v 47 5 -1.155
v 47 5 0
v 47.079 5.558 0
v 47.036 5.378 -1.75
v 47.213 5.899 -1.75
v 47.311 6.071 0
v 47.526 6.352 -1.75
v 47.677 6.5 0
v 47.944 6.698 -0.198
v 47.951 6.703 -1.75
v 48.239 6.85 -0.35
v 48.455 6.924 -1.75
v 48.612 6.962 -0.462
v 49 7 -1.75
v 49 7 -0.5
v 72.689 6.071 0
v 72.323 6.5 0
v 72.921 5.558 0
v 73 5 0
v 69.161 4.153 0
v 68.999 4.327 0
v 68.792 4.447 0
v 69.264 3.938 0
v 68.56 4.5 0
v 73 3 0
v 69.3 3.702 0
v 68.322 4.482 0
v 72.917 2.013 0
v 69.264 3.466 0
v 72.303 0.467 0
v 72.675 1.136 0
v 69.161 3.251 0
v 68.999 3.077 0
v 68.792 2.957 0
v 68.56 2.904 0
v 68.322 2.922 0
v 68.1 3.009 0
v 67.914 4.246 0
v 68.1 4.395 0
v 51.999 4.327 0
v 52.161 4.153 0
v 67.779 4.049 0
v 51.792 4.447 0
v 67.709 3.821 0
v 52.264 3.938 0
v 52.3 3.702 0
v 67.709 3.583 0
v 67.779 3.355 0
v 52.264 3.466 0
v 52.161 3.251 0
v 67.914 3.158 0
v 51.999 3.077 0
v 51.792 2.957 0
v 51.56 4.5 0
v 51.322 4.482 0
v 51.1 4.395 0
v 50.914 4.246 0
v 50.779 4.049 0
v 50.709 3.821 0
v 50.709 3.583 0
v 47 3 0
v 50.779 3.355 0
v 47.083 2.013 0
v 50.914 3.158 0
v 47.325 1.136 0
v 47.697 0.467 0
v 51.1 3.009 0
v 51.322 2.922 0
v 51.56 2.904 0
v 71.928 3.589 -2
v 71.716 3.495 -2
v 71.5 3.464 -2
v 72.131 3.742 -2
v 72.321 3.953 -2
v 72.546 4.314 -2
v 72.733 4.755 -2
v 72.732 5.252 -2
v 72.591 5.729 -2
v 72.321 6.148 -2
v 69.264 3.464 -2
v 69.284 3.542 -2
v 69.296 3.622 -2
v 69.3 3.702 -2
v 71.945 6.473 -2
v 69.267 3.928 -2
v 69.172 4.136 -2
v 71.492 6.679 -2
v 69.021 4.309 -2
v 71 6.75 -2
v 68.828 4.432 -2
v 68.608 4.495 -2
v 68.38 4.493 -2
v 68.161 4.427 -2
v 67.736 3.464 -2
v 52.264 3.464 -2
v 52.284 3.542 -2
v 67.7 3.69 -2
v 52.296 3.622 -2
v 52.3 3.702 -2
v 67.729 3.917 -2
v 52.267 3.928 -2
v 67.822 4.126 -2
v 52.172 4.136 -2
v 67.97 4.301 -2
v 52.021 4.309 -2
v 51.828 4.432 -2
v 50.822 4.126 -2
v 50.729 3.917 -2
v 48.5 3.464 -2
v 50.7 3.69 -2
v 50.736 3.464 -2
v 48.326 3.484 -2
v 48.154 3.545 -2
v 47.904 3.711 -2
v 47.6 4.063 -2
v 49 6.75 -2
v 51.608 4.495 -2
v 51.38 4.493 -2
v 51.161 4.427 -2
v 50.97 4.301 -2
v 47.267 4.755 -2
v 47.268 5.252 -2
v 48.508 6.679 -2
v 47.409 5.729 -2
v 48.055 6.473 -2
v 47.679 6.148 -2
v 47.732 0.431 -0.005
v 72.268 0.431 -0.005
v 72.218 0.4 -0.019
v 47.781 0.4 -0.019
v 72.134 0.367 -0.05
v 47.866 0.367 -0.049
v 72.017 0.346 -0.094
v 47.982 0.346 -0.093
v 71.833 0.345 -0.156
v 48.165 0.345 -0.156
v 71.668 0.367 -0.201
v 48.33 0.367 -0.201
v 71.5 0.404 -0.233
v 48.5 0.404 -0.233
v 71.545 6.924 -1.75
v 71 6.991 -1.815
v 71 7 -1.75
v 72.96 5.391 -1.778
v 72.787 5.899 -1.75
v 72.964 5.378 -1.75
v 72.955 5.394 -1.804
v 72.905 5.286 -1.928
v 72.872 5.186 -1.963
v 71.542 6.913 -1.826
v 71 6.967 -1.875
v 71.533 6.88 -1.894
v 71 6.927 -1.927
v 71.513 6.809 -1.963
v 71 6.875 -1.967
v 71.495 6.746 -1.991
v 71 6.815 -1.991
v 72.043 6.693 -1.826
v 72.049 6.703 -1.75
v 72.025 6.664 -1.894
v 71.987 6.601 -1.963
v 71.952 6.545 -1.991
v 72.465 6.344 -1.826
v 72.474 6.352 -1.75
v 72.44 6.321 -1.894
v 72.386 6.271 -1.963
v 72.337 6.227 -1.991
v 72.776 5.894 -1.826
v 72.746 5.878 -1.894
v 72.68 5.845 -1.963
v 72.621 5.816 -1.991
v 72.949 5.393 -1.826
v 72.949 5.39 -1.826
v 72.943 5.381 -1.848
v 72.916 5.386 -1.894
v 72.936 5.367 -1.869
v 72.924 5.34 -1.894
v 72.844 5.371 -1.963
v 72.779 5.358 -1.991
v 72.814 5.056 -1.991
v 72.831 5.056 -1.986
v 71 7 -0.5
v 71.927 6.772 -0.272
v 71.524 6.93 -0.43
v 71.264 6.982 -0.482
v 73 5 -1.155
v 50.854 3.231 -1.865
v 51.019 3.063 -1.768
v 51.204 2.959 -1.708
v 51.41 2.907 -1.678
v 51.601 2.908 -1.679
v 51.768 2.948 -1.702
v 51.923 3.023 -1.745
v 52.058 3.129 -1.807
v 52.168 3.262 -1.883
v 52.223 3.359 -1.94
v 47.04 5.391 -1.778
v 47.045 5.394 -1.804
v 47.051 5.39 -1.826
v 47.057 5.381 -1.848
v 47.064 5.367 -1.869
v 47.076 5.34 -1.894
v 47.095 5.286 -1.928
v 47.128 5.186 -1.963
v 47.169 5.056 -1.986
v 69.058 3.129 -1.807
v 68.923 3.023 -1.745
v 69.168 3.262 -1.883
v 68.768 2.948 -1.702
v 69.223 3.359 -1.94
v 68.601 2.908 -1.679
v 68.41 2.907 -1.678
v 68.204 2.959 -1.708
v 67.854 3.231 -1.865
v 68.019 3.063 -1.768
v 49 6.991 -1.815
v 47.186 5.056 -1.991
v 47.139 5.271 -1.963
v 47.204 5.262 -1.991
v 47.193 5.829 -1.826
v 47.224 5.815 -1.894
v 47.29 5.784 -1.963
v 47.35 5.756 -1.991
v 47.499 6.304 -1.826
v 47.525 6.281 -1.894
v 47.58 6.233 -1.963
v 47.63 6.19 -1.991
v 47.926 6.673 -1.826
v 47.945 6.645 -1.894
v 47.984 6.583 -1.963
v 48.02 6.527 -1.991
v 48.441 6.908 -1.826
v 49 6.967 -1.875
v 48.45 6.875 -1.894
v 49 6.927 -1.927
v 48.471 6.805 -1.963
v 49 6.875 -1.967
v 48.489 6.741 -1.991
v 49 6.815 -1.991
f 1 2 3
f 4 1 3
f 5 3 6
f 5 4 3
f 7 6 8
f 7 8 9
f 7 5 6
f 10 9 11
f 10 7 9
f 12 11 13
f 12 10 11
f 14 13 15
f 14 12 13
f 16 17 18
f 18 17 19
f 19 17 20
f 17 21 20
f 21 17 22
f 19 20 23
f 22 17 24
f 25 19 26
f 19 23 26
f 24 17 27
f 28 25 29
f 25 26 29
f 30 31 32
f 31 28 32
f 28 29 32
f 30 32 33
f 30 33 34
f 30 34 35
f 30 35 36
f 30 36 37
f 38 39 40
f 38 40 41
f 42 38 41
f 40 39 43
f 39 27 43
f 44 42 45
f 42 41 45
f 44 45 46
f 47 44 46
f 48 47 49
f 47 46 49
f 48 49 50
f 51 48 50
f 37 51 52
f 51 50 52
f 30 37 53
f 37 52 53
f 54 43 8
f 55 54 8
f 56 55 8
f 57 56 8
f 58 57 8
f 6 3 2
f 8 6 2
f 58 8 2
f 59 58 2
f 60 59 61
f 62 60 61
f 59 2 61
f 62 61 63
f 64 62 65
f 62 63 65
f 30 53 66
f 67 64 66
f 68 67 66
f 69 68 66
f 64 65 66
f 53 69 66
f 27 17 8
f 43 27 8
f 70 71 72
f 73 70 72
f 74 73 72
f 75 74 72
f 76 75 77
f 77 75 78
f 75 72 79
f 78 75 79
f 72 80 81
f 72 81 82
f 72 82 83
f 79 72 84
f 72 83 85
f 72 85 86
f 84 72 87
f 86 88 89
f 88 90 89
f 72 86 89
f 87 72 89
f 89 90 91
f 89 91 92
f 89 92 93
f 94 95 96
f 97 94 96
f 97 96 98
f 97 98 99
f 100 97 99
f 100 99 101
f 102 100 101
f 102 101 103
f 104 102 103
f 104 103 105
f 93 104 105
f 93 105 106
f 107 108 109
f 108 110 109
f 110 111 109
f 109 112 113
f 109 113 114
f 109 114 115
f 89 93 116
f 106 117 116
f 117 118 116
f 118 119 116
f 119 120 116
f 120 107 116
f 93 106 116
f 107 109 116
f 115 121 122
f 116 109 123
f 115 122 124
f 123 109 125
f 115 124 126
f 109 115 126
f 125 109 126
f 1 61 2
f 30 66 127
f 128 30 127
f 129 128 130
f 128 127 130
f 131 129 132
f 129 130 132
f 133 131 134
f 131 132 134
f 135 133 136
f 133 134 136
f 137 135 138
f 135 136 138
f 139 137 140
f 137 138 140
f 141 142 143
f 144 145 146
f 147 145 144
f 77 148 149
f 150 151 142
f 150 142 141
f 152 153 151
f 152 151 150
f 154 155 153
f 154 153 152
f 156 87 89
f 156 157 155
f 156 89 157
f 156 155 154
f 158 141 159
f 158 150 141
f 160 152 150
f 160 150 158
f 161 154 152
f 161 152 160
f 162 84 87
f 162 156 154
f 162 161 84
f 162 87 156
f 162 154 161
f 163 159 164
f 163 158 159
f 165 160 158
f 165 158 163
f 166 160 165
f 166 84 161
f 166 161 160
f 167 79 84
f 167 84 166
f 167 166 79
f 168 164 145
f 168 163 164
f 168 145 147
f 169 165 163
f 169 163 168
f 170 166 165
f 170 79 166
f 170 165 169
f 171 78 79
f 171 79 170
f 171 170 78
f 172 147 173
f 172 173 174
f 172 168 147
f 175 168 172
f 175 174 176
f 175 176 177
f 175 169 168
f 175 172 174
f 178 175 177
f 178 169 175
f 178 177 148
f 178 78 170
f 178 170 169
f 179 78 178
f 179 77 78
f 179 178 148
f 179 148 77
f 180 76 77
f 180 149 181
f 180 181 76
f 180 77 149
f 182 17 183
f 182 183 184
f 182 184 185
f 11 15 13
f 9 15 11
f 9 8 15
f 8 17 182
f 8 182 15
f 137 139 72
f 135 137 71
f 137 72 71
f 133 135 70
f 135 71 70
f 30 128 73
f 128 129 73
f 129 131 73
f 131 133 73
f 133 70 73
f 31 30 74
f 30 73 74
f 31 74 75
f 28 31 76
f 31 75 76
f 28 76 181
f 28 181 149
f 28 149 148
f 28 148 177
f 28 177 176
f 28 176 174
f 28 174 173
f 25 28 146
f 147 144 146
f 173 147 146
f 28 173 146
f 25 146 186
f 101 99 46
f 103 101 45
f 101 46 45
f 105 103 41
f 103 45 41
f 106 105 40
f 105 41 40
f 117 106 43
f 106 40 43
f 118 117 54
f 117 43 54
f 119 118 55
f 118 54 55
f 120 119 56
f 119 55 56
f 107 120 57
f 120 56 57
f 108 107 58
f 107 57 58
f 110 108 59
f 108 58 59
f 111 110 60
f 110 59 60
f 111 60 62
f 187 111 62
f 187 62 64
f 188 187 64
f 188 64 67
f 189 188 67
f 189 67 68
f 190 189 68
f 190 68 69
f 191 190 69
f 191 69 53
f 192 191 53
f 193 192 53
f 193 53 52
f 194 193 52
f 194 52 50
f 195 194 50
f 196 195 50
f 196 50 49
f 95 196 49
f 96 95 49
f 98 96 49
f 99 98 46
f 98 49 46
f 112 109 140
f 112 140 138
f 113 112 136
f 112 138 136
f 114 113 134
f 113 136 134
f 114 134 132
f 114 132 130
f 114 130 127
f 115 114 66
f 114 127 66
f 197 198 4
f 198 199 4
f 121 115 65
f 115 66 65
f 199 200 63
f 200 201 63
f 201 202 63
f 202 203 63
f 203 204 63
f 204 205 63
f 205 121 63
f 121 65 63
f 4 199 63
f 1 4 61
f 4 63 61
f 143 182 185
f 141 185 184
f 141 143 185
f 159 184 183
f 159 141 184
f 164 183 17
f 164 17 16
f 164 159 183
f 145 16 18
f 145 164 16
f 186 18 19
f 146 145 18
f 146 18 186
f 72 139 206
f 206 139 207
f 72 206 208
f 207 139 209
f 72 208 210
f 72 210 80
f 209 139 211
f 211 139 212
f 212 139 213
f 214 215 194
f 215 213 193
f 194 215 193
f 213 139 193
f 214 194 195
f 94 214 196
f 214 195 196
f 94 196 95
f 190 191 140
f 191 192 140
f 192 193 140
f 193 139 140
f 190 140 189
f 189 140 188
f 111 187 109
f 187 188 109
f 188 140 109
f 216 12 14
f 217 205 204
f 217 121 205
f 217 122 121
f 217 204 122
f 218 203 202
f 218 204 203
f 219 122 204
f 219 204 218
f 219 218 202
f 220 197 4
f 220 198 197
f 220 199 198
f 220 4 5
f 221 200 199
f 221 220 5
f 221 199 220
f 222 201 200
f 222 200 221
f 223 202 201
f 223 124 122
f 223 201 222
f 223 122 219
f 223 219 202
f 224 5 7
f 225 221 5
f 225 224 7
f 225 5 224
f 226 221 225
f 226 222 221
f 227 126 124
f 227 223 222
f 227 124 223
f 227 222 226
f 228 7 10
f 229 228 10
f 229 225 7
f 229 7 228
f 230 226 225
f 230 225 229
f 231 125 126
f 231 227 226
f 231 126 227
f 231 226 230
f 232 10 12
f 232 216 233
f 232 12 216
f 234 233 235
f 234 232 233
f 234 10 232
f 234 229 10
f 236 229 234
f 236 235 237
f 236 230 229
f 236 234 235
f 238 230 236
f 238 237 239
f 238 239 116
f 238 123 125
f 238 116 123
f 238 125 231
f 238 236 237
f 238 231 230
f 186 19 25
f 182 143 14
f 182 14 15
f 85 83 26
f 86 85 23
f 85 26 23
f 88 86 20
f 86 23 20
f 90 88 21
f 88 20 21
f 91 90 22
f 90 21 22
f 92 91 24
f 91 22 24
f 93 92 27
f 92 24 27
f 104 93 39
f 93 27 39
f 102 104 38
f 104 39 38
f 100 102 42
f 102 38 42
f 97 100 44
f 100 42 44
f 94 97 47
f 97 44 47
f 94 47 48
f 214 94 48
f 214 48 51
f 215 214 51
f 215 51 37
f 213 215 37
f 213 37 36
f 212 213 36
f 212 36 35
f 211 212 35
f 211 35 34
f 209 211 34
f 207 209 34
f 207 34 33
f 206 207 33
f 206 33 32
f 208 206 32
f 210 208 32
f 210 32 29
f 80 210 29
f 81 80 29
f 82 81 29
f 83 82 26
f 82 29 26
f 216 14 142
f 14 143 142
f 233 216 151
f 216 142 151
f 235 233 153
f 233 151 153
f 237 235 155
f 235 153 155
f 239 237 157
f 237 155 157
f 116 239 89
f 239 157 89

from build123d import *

# Parameters (mm, degrees)
WEDGE_GENERAL_SHAPE_DEPTH      = 73
SIDE_FILLET_R                  = 1.5
CORNER_START                   = -3
CORNER_FILLET_DEPTH            = 4
KNIFE_EDGE_REMOVER_R           = 0.125
CARD_GUIDE_SIZE                = 0.5
SKETCH14_W                     = 47
SKETCH14_H                     = 7
BABY_WEDGE_SHORTENER_DEPTH     = 10
BABY_WEDGE_SIDE_FILLET_R       = 1.5
BABY_START                     = -3
BABY_WEDGE_CORNER_FILLET_DEPTH = 4
M2X0_4_TAPPED_HOLE2_D          = 1.6
BABY_BITE_FILLET_R             = 0.25


with BuildPart() as part:
    # Sketch2 → Wedge General Shape (new body)
    with BuildSketch(Plane(origin=(0, 0, 0), x_dir=(0, 0, -1), z_dir=(1, 0, 0))):
        Polygon((0, 7), (0, 0), (2, 3.464101615), (2, 7), align=None)
    extrude(amount=WEDGE_GENERAL_SHAPE_DEPTH)

    # Side Fillet
    side_fillet_edges = [part.edges().sort_by_distance(p)[0] for p in [
        (73, 1.732050808, -1),
        (0, 1.732050808, -1),
    ]]
    fillet(side_fillet_edges, radius=SIDE_FILLET_R)

    # Corner Fillet: read off the stored shape, not the designer's step
    # Corner Fillet outline → Corner Fillet (cut)
    with BuildSketch(Plane.XY.offset(CORNER_START)):
        with BuildLine():
            Line((73, 7), (71, 7))
            ThreePointArc((71, 7), (72.414213562, 6.414213562), (73, 5))
            Line((73, 5), (73, 7))
        make_face()
        with BuildLine():
            ThreePointArc((0, 5), (0.585786438, 6.414213562), (2, 7))
            Line((2, 7), (0, 7))
            Line((0, 7), (0, 5))
        make_face()
    extrude(amount=CORNER_FILLET_DEPTH, mode=Mode.SUBTRACT)

    # Knife Edge Remover
    # the kernel refuses this fillet: 0.125 mm, written as the material it takes off along each edge
    with BuildSketch(Plane(origin=(0.333734123, 0, 0), x_dir=(0, 1, 0), z_dir=(1, 0, 0))) as knife_edge_remover_piece_1:
        with BuildLine():
            CenterArc((KNIFE_EDGE_REMOVER_R * 3.73205080757, -KNIFE_EDGE_REMOVER_R), KNIFE_EDGE_REMOVER_R, 90, 150)
            Line((KNIFE_EDGE_REMOVER_R * 3.23205080757, -KNIFE_EDGE_REMOVER_R * 1.86602540378), (0, 0))
            Line((0, 0), (KNIFE_EDGE_REMOVER_R * 3.73205080757, 0))
        make_face()
    extrude(amount=72.332531755, mode=Mode.SUBTRACT)

    # Card Guide
    # the kernel refuses this chamfer: 0.5 mm, written as the material it takes off along each edge
    with BuildSketch(Plane(origin=(-0.18593054, 7, 0), x_dir=(0, -1, 0), z_dir=(1, 0, 0))) as card_guide_piece_1:
        Polygon((CARD_GUIDE_SIZE, 0), (0, CARD_GUIDE_SIZE), (0, 0), align=None)
    extrude(amount=73.37186108, mode=Mode.SUBTRACT)

    # Sketch14 → Baby Wedge Shortener (cut)
    with BuildSketch(Plane.XY):
        with Locations((23.5, 3.5)):
            Rectangle(SKETCH14_W, SKETCH14_H)
    extrude(amount=-BABY_WEDGE_SHORTENER_DEPTH, mode=Mode.SUBTRACT)

    # Baby Wedge Side Fillet
    # the kernel refuses this fillet: 1.5 mm, written as the material it takes off along each edge
    with BuildSketch(Plane(origin=(47, -2.843588913, 1.641746825), x_dir=(0, 0.49999999999999317, 0.8660254037844426), z_dir=(0, 0.8660254037844427, -0.4999999999999932))) as baby_wedge_side_fillet_piece_1:
        with BuildLine():
            CenterArc((BABY_WEDGE_SIDE_FILLET_R, BABY_WEDGE_SIDE_FILLET_R), BABY_WEDGE_SIDE_FILLET_R, 180, 90)
            Line((0, BABY_WEDGE_SIDE_FILLET_R), (0, 0))
            Line((0, 0), (BABY_WEDGE_SIDE_FILLET_R, 0))
        make_face()
    extrude(amount=11.033493649, mode=Mode.SUBTRACT)

    # Baby Wedge Corner Fillet: read off the stored shape, not the designer's step
    # Baby Wedge Corner Fillet outline → Baby Wedge Corner Fillet (cut)
    with BuildSketch(Plane.XY.offset(BABY_START)):
        with BuildLine():
            ThreePointArc((47, 5), (47.585786438, 6.414213562), (49, 7))
            Line((49, 7), (47, 7))
            Line((47, 7), (47, 5))
        make_face()
    extrude(amount=BABY_WEDGE_CORNER_FILLET_DEPTH, mode=Mode.SUBTRACT)

    # M2x0.4 Tapped Hole2 (through all)
    with Locations(Plane(origin=(0, 0, -2), x_dir=(-1, 0, 0), z_dir=(0, 0, -1))):
        with Locations((-68.5, 3.702003175), (-51.5, 3.702003175)):
            Hole(M2X0_4_TAPPED_HOLE2_D / 2)

    # Baby Bite Fillet
    baby_bite_fillet_edges = [part.edges().sort_by_distance(p)[0] for p in [
        (47.790438534, 6.592784059, -2),
        (72.209561466, 6.592784059, -2),
        (60, 7, -2),
    ]]
    fillet(baby_bite_fillet_edges, radius=BABY_BITE_FILLET_R)


solid = part.part
